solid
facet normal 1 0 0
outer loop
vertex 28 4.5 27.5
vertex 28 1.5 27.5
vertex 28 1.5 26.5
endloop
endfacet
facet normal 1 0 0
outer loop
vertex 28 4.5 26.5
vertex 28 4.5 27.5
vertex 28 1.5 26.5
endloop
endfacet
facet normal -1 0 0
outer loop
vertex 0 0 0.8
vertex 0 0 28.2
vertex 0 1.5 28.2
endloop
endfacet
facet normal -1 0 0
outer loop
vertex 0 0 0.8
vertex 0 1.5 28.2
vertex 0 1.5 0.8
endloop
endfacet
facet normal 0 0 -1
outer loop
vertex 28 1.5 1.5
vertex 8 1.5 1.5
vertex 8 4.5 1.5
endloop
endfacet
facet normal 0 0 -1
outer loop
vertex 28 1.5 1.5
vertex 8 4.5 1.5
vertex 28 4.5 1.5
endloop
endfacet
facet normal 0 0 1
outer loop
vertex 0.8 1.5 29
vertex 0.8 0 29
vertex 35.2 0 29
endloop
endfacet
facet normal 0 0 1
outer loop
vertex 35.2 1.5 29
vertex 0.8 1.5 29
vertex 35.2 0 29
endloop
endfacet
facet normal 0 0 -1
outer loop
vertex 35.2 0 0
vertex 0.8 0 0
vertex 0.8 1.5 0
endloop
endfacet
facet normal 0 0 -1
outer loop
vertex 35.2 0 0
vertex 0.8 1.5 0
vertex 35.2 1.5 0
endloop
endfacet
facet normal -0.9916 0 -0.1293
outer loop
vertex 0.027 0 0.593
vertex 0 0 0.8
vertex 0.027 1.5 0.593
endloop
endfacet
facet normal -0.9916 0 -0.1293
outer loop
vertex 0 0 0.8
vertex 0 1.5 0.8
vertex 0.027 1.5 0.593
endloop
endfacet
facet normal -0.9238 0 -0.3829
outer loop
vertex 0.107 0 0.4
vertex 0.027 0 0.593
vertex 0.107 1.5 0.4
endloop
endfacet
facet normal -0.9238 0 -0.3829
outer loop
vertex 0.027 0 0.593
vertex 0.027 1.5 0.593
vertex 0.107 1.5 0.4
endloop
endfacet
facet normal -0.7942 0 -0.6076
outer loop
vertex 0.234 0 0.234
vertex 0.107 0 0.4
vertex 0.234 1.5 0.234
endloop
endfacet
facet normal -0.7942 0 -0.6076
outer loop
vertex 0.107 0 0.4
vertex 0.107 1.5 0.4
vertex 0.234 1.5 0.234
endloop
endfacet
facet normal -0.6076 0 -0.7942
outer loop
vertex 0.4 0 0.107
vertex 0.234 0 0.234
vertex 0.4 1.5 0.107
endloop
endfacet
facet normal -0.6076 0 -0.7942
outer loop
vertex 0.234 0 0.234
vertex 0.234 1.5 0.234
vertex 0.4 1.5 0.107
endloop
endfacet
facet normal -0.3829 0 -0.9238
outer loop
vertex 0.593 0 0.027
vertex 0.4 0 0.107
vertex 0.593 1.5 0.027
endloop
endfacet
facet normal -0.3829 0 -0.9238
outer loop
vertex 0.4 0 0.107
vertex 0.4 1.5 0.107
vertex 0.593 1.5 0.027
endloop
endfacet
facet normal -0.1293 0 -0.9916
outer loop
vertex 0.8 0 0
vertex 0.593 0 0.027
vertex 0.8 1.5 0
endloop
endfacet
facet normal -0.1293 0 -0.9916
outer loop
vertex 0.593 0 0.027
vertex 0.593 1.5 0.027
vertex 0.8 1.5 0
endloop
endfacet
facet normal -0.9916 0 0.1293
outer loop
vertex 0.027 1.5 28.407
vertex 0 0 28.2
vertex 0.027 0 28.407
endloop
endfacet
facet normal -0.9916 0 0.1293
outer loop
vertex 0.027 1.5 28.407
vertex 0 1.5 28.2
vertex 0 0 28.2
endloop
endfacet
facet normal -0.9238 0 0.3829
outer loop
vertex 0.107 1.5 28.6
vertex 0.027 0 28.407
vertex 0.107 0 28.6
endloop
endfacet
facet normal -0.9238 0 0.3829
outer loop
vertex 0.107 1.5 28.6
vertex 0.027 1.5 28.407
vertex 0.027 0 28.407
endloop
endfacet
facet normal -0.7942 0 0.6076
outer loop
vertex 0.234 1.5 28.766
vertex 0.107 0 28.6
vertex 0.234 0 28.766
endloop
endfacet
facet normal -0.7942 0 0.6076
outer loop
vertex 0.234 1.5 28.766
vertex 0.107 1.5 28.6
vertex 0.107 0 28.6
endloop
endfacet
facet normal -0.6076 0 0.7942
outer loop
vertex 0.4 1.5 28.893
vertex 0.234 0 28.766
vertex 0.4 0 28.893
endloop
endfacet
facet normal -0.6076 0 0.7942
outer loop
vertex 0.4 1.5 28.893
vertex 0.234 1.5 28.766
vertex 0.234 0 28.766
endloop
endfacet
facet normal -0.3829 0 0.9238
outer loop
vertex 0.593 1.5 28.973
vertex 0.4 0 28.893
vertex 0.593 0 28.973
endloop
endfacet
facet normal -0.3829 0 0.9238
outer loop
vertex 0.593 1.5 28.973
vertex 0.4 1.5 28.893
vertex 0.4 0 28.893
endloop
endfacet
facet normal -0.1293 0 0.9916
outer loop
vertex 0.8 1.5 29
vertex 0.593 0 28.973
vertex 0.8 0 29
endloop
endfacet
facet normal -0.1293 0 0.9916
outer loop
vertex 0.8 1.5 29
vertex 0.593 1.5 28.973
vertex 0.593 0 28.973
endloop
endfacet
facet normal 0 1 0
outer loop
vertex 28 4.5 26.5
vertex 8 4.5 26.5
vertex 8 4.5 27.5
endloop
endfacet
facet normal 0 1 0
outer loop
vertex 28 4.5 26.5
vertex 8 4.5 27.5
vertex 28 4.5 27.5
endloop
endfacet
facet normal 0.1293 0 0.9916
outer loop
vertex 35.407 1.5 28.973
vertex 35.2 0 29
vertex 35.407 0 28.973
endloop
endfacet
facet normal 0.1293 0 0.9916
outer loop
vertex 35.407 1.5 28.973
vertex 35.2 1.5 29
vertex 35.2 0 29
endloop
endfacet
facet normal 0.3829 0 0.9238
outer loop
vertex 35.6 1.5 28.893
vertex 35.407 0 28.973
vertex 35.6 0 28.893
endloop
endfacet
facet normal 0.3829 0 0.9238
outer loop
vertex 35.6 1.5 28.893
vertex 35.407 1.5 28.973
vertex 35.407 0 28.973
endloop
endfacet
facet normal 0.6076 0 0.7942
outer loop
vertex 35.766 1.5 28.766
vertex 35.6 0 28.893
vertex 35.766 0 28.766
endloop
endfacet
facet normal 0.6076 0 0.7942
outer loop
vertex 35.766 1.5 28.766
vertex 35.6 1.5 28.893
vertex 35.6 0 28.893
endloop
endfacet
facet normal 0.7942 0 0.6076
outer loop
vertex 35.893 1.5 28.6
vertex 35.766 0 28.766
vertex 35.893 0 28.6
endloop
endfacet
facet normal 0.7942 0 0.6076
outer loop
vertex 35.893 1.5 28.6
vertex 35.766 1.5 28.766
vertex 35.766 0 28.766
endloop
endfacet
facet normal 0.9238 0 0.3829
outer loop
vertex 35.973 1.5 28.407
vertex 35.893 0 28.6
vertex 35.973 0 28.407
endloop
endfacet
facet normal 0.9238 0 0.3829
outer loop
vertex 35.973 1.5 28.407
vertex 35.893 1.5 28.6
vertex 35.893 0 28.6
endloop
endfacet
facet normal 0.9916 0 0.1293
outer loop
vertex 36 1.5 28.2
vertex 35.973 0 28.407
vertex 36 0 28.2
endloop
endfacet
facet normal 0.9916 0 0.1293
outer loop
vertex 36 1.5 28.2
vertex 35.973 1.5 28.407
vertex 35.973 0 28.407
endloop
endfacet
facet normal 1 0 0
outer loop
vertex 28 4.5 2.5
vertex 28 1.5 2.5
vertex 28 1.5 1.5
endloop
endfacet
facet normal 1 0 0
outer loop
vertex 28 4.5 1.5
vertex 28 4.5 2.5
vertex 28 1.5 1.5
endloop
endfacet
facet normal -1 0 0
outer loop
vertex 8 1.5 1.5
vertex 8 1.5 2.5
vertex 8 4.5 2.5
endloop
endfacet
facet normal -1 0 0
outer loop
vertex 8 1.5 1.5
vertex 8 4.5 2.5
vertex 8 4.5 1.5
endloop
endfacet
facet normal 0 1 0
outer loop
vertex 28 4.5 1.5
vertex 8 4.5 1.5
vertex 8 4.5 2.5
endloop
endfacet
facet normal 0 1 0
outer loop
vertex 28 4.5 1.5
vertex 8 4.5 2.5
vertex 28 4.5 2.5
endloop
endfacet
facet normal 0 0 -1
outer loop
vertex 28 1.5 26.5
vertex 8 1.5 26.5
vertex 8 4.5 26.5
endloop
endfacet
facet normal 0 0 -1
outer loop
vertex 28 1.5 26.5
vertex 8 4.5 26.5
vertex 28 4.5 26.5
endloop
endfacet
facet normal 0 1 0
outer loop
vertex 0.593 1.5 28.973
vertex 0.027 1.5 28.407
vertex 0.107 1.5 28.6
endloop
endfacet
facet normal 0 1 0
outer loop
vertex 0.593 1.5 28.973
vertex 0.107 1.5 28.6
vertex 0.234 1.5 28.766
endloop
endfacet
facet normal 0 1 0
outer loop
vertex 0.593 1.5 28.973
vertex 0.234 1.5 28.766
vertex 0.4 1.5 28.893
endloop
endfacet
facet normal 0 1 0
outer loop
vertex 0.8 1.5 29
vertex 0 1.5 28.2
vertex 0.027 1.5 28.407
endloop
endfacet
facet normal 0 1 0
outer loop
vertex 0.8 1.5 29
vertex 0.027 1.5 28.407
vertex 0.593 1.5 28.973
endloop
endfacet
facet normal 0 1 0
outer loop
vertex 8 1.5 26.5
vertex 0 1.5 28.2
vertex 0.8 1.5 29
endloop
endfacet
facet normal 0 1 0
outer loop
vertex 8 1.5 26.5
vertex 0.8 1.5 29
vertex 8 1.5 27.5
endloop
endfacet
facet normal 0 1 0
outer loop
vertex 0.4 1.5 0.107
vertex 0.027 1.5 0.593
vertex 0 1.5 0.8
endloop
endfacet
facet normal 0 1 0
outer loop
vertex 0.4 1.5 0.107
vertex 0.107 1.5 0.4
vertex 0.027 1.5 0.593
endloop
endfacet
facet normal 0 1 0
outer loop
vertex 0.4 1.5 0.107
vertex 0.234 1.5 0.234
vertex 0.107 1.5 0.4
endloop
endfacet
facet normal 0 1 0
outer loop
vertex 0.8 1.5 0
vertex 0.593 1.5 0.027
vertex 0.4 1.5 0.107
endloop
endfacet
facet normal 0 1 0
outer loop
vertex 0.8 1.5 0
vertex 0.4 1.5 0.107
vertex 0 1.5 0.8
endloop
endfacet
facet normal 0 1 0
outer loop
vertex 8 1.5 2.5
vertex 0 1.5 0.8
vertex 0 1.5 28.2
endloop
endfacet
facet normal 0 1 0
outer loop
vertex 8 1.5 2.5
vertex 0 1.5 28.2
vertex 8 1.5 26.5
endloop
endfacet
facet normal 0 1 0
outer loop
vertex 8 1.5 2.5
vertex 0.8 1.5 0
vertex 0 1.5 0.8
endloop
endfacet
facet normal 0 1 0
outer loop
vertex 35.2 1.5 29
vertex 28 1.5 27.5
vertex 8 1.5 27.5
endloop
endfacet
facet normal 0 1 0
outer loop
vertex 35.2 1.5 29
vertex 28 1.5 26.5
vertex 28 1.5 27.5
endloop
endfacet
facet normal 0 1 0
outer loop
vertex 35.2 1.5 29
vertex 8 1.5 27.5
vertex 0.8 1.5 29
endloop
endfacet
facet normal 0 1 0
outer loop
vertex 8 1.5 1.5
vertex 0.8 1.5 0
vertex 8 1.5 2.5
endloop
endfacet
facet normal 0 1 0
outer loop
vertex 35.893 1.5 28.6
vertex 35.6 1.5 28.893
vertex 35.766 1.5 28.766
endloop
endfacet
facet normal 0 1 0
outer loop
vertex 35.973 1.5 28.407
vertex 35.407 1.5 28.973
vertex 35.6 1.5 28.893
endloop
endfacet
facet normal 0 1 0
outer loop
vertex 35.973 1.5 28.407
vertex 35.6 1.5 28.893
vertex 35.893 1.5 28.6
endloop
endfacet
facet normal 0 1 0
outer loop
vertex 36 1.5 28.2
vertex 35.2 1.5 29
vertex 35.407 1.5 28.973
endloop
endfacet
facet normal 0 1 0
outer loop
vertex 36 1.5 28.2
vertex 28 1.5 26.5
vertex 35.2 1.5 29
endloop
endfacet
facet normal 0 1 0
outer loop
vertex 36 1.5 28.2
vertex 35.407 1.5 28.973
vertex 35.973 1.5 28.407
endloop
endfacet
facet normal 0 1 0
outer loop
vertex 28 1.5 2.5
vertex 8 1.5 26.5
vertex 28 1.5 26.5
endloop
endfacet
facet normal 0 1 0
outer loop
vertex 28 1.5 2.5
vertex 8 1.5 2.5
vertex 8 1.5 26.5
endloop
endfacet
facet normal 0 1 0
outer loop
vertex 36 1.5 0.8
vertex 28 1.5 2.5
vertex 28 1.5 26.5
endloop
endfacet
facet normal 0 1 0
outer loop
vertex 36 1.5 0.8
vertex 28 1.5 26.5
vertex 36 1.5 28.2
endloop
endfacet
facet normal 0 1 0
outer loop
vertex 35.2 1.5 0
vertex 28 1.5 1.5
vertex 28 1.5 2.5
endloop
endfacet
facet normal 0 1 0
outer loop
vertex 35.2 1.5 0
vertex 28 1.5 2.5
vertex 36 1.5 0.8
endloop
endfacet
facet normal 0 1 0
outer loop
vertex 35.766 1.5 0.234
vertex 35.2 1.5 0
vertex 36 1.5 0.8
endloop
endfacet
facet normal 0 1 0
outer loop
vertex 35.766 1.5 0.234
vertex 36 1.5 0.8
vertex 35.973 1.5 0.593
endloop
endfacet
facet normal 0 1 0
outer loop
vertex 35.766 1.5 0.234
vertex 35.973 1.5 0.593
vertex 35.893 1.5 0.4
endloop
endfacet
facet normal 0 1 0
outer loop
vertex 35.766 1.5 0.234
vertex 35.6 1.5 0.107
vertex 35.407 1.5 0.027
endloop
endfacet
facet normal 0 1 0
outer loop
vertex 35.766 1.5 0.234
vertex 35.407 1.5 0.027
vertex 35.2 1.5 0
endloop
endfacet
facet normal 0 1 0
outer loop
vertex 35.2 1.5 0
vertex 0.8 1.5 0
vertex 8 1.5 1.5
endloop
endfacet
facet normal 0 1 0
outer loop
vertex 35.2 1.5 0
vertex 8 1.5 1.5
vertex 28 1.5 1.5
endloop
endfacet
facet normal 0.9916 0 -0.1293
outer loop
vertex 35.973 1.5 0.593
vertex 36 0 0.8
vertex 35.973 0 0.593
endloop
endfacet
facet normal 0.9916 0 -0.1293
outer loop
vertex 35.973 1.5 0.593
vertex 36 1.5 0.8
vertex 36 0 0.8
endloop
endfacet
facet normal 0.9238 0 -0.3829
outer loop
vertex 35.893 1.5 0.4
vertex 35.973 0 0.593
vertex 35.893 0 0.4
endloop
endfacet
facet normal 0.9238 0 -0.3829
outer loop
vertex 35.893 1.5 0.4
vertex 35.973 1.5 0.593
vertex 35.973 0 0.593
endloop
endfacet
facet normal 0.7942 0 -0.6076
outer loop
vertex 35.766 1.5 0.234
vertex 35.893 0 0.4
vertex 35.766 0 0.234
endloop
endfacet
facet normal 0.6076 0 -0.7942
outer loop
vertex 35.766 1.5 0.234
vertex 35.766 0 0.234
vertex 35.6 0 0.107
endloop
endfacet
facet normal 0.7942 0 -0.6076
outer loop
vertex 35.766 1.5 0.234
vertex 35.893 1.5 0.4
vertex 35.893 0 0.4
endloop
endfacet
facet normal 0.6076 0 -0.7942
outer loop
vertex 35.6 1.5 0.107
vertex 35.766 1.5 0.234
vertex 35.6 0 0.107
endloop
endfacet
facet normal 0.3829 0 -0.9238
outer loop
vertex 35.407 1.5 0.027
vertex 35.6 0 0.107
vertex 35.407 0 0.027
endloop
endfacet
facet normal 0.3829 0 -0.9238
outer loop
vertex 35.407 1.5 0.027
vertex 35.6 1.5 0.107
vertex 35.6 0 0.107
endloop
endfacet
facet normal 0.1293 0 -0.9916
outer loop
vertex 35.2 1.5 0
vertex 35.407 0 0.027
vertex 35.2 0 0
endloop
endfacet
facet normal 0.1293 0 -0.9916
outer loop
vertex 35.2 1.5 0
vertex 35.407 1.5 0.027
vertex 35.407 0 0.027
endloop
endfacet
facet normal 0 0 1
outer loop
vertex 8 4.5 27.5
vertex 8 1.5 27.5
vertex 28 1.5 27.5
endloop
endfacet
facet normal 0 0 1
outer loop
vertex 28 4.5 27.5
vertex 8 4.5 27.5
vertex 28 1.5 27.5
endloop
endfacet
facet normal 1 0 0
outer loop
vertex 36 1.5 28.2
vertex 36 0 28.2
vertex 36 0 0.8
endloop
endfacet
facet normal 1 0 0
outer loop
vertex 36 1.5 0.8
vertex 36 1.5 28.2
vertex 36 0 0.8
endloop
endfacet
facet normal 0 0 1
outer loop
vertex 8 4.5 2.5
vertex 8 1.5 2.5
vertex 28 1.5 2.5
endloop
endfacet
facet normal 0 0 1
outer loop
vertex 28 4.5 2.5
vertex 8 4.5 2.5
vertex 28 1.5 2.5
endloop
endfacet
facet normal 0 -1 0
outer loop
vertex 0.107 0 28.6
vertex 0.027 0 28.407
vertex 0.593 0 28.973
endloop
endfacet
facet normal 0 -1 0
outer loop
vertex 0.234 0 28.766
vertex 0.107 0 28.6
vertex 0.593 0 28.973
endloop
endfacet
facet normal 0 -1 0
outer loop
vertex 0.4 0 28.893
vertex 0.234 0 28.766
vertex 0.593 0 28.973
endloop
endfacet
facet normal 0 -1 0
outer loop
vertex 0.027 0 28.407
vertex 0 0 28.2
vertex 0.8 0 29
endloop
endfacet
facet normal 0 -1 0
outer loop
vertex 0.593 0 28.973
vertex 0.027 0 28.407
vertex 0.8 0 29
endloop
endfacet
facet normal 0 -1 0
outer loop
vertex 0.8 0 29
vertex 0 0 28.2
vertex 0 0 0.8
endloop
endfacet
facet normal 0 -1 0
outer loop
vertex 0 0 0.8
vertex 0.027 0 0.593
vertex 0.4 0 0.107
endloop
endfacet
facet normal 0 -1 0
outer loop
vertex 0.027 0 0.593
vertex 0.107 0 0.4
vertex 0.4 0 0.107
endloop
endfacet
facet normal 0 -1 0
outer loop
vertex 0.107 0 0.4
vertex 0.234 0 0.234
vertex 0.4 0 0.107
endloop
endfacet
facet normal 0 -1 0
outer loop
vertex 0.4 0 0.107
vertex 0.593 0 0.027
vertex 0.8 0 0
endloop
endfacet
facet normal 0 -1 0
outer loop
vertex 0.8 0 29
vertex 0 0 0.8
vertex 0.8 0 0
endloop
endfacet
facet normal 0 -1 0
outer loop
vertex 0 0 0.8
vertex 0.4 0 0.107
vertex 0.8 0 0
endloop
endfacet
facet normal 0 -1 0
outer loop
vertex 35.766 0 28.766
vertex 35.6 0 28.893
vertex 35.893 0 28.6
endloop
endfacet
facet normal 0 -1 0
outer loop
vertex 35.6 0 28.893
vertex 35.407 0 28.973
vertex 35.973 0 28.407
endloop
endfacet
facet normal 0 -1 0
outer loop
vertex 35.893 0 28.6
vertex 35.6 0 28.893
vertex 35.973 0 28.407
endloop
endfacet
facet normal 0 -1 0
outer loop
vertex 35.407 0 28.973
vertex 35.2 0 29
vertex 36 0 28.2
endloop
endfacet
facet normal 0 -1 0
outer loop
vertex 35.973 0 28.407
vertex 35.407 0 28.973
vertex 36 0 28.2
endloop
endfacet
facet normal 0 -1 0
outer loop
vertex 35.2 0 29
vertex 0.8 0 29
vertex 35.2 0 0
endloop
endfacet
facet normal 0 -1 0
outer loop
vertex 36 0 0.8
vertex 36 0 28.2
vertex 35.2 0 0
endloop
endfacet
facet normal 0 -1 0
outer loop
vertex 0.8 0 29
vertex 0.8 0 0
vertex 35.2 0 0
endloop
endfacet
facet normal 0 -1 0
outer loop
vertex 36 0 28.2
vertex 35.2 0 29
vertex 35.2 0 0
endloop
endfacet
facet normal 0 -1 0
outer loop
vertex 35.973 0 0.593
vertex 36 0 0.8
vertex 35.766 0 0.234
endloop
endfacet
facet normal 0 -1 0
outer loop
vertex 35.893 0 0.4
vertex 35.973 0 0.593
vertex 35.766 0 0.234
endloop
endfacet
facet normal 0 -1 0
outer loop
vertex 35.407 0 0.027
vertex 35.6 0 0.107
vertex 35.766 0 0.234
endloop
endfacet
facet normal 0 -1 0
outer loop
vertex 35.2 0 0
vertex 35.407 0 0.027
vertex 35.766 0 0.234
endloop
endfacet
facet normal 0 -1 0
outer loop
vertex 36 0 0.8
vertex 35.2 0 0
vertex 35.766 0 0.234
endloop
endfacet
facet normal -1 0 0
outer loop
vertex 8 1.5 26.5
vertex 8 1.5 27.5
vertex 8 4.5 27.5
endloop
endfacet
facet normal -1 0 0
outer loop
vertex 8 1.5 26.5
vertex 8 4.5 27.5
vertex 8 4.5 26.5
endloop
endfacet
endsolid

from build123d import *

# Parameters (mm, degrees)
SKETCH1_W           = 36
SKETCH1_H           = 29
BOSS_EXTRUDE1_DEPTH = 1.5
FILLET1_R           = 0.8
SKETCH2_W           = 20
SKETCH2_H           = 1
BOSS_EXTRUDE2_DEPTH = 3


with BuildPart() as part:
    # Sketch1 → Boss-Extrude1 (new body)
    with BuildSketch(Plane(origin=(0, 0, 0), x_dir=(1, 0, 0), z_dir=(0, 1, 0))):
        with Locations((18, -14.5)):
            Rectangle(SKETCH1_W, SKETCH1_H)
    extrude(amount=BOSS_EXTRUDE1_DEPTH)

    # Fillet1
    fillet1_edges = [part.edges().sort_by_distance(p)[0] for p in [
        (0, 0.75, 0),
        (36, 0.75, 0),
        (36, 0.75, 29),
        (0, 0.75, 29),
    ]]
    fillet(fillet1_edges, radius=FILLET1_R)

    # Sketch2 → Boss-Extrude2 (add)
    with BuildSketch(Plane(origin=(0, 1.5, 0), x_dir=(1, 0, 0), z_dir=(0, 1, 0))):
        with Locations((18, -2)):
            Rectangle(SKETCH2_W, SKETCH2_H)
        with Locations((18, -27)):
            Rectangle(SKETCH2_W, SKETCH2_H)
    extrude(amount=BOSS_EXTRUDE2_DEPTH)


solid = part.part
